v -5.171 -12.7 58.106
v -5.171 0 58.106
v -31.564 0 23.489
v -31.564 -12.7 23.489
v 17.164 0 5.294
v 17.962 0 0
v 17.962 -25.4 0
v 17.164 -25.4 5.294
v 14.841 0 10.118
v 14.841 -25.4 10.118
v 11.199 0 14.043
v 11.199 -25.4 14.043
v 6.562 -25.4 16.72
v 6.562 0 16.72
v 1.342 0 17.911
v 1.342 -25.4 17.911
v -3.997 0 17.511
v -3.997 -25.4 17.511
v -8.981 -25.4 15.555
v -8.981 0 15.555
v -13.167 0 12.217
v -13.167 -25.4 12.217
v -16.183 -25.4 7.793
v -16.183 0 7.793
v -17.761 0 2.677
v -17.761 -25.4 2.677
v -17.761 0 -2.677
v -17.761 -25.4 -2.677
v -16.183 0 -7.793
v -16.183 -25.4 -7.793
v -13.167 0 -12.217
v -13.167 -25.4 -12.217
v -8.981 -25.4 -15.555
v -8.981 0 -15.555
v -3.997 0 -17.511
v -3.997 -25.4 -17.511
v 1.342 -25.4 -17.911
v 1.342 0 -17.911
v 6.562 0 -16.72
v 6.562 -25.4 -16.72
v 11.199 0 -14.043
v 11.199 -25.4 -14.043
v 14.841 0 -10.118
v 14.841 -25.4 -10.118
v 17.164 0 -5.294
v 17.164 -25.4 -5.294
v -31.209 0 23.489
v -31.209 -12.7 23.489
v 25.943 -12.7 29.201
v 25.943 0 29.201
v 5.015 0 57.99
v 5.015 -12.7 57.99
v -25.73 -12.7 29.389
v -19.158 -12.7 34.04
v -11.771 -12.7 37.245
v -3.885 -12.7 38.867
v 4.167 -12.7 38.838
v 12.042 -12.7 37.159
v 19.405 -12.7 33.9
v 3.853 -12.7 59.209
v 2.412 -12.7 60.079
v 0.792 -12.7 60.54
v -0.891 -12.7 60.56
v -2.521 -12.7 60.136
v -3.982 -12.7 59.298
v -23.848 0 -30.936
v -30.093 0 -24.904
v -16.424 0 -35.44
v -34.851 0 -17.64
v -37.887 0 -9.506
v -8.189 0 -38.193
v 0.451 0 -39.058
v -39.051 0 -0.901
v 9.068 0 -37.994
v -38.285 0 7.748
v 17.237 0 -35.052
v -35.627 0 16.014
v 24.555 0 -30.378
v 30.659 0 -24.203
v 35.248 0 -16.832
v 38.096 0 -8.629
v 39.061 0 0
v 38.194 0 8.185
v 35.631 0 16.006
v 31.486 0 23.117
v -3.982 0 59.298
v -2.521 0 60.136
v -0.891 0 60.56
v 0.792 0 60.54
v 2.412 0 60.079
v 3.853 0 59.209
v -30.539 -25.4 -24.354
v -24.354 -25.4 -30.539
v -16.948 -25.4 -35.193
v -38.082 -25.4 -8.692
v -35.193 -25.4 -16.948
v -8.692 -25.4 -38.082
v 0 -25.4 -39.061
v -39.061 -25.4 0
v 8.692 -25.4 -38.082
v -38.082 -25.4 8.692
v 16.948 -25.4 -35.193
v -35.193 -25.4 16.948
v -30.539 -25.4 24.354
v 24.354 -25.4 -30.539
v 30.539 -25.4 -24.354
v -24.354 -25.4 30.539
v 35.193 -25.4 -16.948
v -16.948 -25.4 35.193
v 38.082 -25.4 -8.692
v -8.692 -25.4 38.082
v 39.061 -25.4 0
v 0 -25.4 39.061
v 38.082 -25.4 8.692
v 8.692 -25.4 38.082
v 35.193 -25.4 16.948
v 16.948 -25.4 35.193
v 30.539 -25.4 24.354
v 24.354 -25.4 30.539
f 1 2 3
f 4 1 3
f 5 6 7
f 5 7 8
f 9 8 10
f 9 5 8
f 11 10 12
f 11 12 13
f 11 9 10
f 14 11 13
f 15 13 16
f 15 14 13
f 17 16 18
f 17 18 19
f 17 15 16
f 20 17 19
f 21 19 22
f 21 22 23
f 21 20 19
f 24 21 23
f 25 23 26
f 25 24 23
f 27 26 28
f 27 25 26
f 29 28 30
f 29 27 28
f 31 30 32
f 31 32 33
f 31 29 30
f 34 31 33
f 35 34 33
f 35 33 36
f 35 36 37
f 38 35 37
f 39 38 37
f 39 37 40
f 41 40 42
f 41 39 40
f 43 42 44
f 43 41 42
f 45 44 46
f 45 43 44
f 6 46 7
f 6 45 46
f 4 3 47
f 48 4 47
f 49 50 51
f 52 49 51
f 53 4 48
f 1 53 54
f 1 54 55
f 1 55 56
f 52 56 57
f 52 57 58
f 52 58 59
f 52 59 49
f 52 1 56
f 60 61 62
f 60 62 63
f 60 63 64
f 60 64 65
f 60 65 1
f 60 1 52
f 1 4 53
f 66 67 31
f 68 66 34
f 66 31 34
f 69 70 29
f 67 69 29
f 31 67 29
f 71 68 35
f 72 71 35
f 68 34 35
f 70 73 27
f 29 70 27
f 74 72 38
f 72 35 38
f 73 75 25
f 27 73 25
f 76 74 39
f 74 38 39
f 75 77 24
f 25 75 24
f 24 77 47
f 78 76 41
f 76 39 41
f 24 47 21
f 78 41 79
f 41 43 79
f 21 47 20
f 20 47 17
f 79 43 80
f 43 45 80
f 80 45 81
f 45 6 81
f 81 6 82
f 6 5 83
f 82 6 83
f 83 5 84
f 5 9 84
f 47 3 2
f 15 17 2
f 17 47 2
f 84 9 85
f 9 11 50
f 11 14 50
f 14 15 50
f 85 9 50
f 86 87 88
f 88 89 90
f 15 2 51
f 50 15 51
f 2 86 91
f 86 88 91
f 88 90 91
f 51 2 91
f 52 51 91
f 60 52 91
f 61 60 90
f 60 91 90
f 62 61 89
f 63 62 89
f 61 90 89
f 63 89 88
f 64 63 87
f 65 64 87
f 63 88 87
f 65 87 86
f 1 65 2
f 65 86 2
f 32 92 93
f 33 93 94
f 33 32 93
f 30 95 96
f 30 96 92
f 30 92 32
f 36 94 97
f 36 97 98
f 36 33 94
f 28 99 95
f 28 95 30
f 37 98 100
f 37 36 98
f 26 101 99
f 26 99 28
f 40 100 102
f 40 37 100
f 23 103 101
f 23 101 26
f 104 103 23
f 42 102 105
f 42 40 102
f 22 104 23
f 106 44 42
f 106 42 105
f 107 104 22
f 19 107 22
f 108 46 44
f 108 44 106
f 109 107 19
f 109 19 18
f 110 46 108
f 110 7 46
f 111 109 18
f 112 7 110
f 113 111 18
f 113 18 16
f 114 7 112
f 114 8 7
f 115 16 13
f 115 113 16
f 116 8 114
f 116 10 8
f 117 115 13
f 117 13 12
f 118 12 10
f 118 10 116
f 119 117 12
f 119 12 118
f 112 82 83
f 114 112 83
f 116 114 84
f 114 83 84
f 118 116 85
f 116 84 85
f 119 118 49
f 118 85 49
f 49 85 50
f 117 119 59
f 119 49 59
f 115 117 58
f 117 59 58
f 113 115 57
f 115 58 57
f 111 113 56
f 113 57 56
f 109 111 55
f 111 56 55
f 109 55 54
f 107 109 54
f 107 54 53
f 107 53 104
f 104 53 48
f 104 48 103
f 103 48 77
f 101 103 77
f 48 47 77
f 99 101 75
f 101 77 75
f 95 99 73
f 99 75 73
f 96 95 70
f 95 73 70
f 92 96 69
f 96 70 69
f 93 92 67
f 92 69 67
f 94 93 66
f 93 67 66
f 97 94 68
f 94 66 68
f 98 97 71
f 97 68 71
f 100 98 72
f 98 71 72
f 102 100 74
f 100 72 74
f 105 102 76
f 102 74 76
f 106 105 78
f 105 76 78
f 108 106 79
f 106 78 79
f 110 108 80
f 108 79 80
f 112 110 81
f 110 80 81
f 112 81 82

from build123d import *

# Parameters (mm, degrees)
F0_R     = 39.060961
F0_R_2   = 17.961564
F1_DEPTH = 25.4
F3_DEPTH = 12.7


with BuildPart() as f1:
    # F0 (on Front) → F1 (new body)
    with BuildSketch(Plane.XZ):
        Circle(F0_R)
        Circle(F0_R_2, mode=Mode.SUBTRACT)
    extrude(amount=F1_DEPTH)

    # F2 (on Front) → F3 (join)
    with BuildSketch(Plane.XZ):
        with BuildLine():
            Line((-5.171036, 58.106368), (-31.56358, 23.489174))
            Line((-31.56358, 23.489174), (30.095503, 23.489174))
            Line((30.095503, 23.489174), (5.014983, 57.990182))
            ThreePointArc((5.014983, 57.990182), (-0.048852, 60.605962), (-5.171036, 58.106368))
        make_face()
    extrude(amount=F3_DEPTH)


solid = f1.part
